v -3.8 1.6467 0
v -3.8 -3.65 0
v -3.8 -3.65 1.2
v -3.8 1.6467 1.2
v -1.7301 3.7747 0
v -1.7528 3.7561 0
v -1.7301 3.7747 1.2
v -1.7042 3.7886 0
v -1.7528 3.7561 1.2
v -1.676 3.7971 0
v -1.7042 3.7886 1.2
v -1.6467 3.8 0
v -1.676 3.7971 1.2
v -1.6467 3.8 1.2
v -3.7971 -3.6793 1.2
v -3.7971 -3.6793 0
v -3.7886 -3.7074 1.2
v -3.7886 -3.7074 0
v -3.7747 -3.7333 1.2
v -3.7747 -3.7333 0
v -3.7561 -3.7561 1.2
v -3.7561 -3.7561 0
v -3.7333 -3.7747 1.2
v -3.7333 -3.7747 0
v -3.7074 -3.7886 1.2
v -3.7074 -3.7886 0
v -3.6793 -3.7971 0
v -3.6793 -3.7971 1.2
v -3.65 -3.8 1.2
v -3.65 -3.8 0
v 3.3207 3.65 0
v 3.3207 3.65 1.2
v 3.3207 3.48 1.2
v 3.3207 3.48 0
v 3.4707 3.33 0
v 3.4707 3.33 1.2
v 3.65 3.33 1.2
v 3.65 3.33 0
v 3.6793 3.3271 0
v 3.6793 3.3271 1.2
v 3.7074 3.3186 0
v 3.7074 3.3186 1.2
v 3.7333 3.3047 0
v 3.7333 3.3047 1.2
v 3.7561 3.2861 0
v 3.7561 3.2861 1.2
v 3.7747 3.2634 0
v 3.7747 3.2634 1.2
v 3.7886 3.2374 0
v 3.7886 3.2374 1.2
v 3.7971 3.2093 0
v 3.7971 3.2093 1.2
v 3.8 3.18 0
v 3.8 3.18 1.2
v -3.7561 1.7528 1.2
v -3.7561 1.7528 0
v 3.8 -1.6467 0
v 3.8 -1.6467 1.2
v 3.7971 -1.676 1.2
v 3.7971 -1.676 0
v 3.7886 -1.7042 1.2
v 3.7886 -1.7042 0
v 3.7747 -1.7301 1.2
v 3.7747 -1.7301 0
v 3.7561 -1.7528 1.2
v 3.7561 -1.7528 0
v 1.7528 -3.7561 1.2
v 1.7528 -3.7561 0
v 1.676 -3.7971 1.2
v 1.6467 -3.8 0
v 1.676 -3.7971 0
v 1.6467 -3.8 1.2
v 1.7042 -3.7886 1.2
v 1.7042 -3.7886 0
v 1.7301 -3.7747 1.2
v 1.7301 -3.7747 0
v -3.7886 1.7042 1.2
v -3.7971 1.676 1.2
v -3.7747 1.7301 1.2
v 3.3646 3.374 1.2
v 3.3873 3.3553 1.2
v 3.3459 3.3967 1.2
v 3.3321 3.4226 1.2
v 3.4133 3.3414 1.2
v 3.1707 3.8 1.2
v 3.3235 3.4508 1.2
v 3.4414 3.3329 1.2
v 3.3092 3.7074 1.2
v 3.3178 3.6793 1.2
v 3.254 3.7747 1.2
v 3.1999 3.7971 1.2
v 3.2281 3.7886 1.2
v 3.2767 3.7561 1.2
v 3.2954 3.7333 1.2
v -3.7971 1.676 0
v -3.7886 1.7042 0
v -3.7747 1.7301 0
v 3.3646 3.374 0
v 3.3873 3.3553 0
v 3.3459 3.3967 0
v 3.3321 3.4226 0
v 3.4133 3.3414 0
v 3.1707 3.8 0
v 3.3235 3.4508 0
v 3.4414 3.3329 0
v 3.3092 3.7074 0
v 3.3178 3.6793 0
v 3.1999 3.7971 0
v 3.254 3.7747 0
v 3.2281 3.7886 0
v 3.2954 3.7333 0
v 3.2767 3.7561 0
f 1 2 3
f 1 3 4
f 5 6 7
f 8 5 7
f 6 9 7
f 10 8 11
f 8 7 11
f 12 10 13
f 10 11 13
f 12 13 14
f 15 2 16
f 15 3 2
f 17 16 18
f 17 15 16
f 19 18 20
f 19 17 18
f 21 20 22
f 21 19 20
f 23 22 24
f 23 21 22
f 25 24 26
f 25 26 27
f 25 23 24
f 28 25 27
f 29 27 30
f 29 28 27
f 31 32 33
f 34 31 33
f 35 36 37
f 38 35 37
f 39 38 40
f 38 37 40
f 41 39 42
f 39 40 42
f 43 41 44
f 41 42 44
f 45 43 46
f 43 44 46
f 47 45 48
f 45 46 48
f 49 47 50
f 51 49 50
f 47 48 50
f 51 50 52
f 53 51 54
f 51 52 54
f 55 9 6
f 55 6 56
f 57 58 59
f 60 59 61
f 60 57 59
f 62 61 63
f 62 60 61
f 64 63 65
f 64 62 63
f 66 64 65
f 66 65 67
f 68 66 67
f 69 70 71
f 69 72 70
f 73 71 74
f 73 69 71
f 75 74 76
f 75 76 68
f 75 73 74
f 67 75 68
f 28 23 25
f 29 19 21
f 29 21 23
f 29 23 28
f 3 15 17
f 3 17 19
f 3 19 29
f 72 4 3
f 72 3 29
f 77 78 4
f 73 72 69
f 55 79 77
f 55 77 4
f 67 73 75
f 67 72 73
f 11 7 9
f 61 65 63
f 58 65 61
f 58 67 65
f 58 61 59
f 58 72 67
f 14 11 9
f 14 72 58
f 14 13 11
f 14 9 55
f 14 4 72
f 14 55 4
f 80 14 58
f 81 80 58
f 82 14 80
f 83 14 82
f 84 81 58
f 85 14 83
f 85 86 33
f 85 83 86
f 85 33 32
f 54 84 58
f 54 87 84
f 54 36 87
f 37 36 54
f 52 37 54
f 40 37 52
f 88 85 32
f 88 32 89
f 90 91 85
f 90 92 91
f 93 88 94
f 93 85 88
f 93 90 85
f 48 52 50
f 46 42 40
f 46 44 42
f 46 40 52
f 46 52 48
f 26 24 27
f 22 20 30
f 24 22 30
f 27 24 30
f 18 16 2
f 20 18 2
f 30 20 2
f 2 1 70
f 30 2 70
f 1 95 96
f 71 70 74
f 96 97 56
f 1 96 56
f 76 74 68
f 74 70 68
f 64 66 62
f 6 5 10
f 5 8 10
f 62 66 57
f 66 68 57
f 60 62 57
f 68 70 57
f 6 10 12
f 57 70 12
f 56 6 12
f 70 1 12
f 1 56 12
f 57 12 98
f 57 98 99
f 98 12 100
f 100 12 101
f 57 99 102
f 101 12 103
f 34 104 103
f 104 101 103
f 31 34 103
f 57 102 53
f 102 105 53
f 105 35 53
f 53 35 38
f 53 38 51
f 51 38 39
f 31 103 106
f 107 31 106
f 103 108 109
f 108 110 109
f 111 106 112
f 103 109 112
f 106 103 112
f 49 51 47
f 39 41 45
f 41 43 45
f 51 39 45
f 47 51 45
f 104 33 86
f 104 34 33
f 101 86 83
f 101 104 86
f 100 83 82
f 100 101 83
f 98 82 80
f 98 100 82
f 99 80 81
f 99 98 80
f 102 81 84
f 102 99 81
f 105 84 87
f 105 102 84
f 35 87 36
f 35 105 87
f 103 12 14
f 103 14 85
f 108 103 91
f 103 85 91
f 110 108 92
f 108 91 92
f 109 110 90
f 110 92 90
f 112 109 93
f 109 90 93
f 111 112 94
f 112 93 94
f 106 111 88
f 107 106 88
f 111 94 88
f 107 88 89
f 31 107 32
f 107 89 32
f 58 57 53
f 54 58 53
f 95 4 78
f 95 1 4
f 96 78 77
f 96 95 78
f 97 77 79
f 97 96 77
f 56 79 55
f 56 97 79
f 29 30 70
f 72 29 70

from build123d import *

# Parameters (mm, degrees)
SKETCH001_W  = 7.6
SKETCH001_H  = 7.6
PAD001_DEPTH = 1.2
POCKET_DEPTH = 5
FILLET_R     = 0.15


with BuildPart() as part:
    # Sketch001 → Pad001 (new body)
    with BuildSketch(Plane.XY):
        Rectangle(SKETCH001_W, SKETCH001_H)
    extrude(amount=PAD001_DEPTH)

    # Sketch002 → Pocket (cut)
    with BuildSketch(Plane.XY.offset(1.2)):
        Polygon((-4.51175, 4.275026), (-1.233854, 4.275026), (-4.51175, 0.99713), align=None)
        Polygon((3.320655, 4.59318), (3.320655, 3.330028), (4.467743, 3.330028), align=None)
        Polygon((4.51175, -0.99713), (1.233854, -4.275026), (4.51175, -4.275026), align=None)
    extrude(amount=-POCKET_DEPTH, mode=Mode.SUBTRACT)

    # Fillet
    fillet_edges = [part.edges().sort_by_distance(p)[0] for p in [
        (-3.8, 1.70888, 0.6),
        (-3.8, -3.8, 0.6),
        (1.70888, -3.8, 0.6),
        (3.8, -1.70888, 0.6),
        (3.8, 3.330028, 0.6),
        (3.320655, 3.330028, 0.6),
        (3.320655, 3.8, 0.6),
        (-1.70888, 3.8, 0.6),
    ]]
    fillet(fillet_edges, radius=FILLET_R)


solid = part.part
